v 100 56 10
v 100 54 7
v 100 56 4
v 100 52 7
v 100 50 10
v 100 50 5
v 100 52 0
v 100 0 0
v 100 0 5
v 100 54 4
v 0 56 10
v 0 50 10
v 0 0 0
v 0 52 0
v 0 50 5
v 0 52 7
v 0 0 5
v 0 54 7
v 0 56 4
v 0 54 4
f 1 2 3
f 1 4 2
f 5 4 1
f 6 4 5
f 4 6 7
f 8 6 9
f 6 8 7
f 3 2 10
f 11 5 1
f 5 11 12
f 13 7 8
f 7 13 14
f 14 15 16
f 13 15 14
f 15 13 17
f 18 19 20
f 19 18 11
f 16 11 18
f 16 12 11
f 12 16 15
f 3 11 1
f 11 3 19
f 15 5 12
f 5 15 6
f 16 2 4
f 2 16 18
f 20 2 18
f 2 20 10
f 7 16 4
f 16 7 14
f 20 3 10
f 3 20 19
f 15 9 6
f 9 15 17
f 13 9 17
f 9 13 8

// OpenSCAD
cube([100,50,5]);
difference()
{
  translate([0,50,0]) cube([100,6,10]);
  translate([-1,52,-1]) cube([105,2,8]);
  translate([-1,53,-1]) cube([105,6,5]);
}
